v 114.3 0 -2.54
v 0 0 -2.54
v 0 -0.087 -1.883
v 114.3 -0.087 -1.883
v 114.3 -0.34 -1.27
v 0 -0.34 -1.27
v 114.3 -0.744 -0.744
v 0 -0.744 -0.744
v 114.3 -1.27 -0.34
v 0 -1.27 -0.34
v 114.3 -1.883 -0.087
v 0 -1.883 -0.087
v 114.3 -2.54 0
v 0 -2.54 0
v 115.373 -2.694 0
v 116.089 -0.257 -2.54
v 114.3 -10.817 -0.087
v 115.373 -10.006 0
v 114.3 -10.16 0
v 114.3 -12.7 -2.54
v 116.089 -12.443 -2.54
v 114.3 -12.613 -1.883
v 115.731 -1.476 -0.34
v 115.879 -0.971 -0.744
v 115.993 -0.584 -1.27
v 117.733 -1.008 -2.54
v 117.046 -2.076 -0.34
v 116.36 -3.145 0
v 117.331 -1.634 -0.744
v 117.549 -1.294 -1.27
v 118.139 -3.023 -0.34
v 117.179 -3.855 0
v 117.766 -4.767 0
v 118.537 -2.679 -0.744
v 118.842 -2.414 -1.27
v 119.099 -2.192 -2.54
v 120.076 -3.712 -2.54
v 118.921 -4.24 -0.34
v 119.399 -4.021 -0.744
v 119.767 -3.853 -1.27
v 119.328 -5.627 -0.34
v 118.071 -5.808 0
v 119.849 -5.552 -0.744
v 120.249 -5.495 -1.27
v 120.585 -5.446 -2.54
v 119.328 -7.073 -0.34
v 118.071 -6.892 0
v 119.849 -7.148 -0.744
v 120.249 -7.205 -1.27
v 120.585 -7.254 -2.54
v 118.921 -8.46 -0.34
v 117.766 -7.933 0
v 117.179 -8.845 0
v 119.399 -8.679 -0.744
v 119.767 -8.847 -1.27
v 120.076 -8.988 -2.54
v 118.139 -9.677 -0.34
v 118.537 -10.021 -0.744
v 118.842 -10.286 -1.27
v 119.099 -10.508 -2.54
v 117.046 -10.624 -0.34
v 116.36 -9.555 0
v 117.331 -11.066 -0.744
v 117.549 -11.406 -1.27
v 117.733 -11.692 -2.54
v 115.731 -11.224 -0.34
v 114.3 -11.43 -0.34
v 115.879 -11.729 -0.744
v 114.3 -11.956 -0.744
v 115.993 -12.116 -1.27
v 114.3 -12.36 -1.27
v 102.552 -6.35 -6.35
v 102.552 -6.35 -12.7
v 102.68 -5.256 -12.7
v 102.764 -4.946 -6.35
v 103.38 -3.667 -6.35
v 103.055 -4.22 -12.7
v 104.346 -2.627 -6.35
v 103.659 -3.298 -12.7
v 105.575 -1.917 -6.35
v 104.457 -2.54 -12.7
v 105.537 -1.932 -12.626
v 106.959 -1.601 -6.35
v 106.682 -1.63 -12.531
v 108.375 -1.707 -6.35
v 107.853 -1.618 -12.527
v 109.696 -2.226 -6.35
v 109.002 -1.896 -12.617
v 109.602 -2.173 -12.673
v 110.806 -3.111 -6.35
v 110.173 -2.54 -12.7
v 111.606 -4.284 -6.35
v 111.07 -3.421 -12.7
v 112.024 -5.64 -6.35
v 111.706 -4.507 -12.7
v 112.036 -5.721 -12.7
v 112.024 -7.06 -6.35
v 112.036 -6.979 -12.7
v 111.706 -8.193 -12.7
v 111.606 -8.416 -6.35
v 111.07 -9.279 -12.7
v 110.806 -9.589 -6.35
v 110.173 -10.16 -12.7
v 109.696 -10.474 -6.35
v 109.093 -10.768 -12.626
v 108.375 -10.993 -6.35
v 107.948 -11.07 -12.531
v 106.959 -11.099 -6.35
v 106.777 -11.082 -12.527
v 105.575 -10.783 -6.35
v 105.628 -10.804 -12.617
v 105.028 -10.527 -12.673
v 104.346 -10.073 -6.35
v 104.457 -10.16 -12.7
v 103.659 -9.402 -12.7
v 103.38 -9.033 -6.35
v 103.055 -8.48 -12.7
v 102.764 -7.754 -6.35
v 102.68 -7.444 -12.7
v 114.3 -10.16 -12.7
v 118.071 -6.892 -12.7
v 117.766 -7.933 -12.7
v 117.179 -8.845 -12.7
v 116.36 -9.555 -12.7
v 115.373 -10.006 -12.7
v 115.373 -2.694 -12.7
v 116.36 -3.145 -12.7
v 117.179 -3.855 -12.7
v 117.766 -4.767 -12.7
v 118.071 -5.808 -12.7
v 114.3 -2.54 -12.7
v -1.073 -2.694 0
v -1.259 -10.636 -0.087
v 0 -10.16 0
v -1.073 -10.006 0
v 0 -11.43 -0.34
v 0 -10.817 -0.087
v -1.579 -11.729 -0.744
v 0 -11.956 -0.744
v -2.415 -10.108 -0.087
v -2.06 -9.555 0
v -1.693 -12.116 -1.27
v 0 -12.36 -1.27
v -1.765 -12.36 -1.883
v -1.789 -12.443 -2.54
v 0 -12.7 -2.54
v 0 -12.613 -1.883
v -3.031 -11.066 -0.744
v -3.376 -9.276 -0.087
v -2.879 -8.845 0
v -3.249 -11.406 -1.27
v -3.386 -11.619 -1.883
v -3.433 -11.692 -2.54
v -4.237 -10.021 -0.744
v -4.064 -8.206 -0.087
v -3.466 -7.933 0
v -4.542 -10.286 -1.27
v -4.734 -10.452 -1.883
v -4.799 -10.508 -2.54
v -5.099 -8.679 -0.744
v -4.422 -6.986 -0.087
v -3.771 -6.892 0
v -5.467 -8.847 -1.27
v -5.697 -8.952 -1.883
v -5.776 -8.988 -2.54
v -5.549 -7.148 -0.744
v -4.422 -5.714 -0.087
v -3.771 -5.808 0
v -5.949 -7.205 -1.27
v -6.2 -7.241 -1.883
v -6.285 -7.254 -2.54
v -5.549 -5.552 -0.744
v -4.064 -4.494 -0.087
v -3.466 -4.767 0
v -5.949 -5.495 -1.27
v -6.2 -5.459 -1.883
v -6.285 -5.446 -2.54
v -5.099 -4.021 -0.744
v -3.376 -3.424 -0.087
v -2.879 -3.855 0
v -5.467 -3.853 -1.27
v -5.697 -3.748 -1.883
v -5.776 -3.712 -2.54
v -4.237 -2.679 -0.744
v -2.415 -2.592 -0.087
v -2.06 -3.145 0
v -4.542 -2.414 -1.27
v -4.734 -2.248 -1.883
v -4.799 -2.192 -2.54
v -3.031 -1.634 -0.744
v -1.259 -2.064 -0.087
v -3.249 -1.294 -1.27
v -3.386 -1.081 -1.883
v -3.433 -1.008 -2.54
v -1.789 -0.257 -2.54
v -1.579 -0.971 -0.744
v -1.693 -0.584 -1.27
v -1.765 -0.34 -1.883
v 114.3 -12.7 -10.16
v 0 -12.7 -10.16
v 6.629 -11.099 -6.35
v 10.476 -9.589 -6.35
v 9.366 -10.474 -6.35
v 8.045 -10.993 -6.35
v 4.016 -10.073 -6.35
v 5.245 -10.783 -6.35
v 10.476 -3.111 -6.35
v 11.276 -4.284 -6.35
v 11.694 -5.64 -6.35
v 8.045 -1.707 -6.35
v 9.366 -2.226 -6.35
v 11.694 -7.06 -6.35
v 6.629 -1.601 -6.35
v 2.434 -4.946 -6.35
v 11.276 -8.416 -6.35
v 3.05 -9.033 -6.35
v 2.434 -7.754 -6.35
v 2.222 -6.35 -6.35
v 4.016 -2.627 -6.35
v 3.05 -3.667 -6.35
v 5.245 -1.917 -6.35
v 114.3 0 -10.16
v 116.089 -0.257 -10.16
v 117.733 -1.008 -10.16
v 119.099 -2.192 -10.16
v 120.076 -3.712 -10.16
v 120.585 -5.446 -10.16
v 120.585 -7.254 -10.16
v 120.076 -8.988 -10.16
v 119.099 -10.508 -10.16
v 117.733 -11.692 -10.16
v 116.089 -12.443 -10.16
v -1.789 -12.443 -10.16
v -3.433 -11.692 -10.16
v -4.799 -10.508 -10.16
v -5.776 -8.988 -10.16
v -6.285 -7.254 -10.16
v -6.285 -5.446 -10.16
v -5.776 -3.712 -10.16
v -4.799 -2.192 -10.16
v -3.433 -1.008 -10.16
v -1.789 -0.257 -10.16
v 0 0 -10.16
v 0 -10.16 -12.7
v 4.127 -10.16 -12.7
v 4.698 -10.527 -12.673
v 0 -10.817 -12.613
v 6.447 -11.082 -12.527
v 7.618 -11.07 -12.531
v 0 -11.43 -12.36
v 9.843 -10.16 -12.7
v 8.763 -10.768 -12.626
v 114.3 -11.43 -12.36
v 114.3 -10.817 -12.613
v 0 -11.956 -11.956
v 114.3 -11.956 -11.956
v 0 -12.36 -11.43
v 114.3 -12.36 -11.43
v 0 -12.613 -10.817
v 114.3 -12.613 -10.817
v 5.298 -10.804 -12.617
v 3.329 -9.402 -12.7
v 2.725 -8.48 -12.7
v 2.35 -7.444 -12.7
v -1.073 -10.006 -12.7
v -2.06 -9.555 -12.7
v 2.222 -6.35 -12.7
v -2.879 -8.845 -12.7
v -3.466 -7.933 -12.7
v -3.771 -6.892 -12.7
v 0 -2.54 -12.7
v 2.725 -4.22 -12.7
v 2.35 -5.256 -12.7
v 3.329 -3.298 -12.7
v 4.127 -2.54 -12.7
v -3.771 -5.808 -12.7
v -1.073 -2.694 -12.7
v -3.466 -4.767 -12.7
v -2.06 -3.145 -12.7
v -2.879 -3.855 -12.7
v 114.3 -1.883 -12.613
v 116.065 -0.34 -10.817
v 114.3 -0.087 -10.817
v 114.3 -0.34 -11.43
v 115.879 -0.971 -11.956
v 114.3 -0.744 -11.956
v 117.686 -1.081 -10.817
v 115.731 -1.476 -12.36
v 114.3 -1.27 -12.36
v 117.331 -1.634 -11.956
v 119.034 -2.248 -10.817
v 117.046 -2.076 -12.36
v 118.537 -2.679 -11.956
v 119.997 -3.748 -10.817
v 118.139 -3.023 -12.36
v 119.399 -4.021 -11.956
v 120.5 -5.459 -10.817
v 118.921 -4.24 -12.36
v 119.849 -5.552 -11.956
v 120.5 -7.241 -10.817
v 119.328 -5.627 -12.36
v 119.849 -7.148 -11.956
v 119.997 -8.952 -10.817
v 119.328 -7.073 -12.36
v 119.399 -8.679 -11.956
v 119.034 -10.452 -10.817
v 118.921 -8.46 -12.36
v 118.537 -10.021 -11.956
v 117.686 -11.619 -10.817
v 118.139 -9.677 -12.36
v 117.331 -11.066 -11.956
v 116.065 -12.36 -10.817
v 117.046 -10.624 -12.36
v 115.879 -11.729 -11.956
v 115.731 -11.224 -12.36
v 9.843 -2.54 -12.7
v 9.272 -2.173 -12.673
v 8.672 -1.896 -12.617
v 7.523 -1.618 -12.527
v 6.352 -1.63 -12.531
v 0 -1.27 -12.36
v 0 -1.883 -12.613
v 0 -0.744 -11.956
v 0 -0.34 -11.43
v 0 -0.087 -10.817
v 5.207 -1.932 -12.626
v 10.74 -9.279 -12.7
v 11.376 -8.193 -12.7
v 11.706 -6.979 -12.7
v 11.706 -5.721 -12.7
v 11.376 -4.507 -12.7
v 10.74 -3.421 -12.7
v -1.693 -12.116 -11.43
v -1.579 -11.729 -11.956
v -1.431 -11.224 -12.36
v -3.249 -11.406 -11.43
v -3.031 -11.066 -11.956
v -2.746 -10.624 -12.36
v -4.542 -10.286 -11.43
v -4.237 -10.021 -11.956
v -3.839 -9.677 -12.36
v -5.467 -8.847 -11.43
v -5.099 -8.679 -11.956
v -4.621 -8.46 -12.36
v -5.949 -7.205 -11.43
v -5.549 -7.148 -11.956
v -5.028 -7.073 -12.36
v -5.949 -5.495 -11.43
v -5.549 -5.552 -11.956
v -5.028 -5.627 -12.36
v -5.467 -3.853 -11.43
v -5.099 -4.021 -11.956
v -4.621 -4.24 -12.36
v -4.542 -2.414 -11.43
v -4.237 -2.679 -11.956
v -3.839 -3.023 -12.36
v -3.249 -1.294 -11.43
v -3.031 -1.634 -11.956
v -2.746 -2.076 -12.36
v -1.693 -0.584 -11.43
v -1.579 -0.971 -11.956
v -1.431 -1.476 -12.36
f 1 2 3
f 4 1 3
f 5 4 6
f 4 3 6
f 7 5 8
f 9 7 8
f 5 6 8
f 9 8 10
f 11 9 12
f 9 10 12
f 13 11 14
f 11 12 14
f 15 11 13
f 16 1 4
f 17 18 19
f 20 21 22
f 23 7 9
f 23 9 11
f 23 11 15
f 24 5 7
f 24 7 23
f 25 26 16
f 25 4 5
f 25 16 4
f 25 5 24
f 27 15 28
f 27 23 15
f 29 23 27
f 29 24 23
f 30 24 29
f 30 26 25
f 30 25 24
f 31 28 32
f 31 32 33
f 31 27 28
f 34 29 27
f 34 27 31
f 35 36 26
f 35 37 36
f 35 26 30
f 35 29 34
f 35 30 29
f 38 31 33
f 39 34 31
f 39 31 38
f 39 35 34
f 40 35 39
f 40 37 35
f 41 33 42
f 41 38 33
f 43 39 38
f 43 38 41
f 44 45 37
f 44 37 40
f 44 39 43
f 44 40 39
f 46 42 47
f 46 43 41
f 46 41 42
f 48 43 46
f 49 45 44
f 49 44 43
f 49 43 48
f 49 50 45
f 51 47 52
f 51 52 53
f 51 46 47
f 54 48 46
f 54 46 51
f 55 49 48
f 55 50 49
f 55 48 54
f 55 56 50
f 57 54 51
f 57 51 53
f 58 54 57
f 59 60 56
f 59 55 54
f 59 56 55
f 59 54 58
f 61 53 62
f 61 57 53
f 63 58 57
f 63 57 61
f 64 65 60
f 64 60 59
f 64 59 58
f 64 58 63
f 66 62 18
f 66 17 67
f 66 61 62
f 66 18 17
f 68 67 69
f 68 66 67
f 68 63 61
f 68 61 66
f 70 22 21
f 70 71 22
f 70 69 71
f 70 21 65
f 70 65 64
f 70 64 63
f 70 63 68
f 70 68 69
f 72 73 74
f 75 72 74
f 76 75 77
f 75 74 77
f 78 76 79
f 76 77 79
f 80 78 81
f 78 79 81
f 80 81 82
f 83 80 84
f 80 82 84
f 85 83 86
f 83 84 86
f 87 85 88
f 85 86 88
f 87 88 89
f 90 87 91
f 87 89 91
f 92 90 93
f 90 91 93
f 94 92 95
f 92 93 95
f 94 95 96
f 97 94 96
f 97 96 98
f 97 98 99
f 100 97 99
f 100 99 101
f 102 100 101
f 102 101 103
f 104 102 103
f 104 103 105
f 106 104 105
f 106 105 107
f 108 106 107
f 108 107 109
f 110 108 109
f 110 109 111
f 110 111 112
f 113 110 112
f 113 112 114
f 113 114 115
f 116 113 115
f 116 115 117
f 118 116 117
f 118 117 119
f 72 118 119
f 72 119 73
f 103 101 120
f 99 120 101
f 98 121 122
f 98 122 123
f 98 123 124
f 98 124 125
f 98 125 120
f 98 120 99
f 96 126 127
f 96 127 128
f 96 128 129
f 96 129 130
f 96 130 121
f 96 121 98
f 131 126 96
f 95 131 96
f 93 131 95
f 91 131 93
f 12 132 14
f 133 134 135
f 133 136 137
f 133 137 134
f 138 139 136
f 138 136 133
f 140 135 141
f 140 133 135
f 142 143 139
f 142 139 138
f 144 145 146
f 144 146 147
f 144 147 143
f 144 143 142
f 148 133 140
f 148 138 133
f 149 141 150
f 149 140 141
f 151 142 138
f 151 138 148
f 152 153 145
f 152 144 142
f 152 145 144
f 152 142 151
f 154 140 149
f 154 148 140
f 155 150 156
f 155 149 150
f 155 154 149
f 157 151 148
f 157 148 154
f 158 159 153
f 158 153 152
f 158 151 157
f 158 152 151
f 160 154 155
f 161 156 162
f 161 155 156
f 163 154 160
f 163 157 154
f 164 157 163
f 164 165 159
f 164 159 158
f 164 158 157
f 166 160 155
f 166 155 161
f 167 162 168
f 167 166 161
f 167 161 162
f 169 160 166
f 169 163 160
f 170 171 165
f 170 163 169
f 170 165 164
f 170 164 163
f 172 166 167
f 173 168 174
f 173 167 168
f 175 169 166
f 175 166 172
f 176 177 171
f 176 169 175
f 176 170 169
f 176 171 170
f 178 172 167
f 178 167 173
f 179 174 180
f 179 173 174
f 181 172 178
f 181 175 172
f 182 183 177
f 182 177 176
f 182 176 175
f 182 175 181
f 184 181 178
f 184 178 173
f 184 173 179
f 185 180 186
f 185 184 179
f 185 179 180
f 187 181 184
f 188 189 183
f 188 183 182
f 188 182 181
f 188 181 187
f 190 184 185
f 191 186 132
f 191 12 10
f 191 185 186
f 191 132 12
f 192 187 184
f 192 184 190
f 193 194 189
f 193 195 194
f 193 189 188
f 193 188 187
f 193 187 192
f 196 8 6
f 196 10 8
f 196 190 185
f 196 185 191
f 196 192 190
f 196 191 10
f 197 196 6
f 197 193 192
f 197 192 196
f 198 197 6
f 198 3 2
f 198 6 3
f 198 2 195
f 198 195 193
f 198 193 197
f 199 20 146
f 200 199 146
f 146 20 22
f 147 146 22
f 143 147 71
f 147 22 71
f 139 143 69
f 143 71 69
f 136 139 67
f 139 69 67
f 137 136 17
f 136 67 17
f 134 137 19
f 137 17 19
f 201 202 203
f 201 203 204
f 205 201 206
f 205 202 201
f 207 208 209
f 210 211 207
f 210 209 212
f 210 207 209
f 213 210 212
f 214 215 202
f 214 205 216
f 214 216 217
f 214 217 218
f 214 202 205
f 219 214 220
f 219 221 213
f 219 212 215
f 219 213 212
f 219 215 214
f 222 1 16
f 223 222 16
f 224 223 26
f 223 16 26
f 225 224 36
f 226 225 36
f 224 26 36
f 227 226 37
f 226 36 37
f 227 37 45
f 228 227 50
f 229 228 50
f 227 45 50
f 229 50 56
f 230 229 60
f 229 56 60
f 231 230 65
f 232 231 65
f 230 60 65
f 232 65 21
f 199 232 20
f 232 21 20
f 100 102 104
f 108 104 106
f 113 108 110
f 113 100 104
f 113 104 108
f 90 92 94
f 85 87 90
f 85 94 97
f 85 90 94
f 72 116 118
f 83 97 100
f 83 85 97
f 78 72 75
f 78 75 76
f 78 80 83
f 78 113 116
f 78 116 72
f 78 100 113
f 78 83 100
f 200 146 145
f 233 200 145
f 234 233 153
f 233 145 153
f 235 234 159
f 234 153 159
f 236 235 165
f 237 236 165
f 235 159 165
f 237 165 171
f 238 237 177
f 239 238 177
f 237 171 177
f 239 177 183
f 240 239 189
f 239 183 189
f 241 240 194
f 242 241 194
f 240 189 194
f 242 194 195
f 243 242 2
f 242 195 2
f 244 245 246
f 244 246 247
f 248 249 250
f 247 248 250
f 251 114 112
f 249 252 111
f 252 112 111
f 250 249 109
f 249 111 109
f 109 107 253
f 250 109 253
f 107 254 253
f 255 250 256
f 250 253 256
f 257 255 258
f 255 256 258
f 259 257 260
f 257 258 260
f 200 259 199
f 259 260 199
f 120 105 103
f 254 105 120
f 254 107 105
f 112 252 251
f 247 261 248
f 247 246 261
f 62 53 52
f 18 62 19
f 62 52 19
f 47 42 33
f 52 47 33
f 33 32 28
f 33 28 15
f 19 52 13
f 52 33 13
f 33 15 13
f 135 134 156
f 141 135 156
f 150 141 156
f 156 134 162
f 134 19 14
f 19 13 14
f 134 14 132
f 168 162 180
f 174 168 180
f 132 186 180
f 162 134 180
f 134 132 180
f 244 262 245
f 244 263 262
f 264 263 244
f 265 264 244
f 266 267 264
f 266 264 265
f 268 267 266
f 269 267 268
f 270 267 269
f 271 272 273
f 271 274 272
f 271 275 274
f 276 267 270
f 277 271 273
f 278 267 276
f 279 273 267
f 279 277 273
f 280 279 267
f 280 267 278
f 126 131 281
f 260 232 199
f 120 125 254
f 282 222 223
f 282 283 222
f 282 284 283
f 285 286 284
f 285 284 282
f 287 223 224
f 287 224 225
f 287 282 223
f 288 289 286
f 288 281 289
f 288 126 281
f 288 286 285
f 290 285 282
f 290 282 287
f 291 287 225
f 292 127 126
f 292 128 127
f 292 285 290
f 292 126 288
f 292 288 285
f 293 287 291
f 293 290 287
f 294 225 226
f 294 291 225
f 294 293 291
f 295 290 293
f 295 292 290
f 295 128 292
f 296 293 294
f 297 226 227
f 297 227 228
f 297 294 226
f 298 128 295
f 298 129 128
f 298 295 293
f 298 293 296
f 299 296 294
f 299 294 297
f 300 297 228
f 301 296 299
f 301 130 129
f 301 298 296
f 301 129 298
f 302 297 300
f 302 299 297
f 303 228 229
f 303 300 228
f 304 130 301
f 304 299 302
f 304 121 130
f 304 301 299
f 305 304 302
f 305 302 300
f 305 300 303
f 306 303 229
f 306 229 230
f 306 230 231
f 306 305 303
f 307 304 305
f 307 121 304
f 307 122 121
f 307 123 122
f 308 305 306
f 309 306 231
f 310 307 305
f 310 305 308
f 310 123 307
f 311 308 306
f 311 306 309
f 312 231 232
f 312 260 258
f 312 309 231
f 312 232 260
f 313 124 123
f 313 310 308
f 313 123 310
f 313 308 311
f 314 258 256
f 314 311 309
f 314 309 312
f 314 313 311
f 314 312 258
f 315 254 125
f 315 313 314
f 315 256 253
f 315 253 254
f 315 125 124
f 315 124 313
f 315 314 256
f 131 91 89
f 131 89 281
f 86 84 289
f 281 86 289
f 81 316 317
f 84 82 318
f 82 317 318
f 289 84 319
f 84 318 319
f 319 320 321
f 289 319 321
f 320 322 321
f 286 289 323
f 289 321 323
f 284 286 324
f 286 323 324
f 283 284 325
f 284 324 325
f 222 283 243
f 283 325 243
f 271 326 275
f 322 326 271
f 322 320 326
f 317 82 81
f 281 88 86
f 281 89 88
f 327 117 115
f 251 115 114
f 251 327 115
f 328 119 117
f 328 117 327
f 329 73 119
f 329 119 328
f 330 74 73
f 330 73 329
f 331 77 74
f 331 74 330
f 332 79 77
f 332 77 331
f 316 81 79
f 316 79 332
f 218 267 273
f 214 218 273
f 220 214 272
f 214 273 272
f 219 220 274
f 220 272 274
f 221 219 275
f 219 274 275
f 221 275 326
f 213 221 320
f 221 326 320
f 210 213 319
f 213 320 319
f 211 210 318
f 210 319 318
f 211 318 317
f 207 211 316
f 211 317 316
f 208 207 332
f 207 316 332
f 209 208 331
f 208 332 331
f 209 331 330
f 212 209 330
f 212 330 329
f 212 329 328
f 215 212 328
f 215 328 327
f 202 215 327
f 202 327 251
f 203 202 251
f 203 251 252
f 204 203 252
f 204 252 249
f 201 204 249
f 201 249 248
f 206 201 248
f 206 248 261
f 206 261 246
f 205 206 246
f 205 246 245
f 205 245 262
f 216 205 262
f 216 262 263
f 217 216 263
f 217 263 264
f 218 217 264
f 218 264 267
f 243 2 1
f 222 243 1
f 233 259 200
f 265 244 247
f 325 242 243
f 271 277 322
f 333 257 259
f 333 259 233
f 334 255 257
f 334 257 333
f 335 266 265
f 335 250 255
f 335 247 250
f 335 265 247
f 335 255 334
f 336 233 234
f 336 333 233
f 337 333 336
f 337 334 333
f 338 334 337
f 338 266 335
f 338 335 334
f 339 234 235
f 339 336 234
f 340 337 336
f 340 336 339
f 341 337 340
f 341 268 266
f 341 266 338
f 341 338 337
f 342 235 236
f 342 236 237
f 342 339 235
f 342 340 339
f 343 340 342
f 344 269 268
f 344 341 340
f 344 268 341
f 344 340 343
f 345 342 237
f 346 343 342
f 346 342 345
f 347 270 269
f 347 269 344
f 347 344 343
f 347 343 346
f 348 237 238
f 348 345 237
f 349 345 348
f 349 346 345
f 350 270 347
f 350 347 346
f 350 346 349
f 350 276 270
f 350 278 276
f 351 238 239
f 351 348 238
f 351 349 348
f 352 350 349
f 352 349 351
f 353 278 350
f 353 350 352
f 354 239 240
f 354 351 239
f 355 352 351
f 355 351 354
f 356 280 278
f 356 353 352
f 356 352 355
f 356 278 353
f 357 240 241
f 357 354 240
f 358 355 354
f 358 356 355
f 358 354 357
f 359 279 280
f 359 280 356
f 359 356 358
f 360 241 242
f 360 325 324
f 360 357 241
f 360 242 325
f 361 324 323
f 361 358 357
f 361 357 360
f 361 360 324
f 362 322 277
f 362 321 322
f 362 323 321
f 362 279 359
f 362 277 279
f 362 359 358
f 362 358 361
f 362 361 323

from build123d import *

# Parameters (mm, degrees)
BOSS_EXTRUDE1_DEPTH = 12.7
SKETCH2_R           = 4.7625
CUT_EXTRUDE1_DEPTH  = 6.35
FILLET1_R           = 2.54


with BuildPart() as part:
    # Sketch1 → Boss-Extrude1 (new body)
    with BuildSketch(Plane.XY):
        with BuildLine():
            Line((0, 0), (114.3, 0))
            ThreePointArc((114.3, 0), (120.65, -6.35), (114.3, -12.7))
            Line((114.3, -12.7), (0, -12.7))
            ThreePointArc((0, -12.7), (-6.35, -6.35), (0, 0))
        make_face()
    extrude(amount=-BOSS_EXTRUDE1_DEPTH)

    # Sketch2 → Cut-Extrude1 (cut)
    with BuildSketch(Plane(origin=(0, 0, -12.7), x_dir=(-1, 0, 0), z_dir=(0, 0, -1))):
        with Locations((-6.985, -6.35)):
            Circle(SKETCH2_R)
        with Locations((-107.315, -6.35)):
            Circle(SKETCH2_R)
    extrude(amount=-CUT_EXTRUDE1_DEPTH, mode=Mode.SUBTRACT)

    # Fillet1
    # the kernel refuses this fillet: 2.54 mm, written as the material it takes off along each edge
    with BuildSketch(Plane(origin=(114.3, -6.35, -12.7), x_dir=(0, 1, 0), z_dir=(-1, 0, 0))) as fillet1_piece_1:
        with BuildLine():
            CenterArc((6.35 - FILLET1_R, -FILLET1_R), FILLET1_R, 0, 90)
            Line((6.35 - FILLET1_R, 0), (6.35, 0))
            Line((6.35, 0), (6.35, -FILLET1_R))
        make_face()
    revolve(axis=Axis((114.3, -6.35, -12.7), (0, 0, -1)), revolution_arc=180, mode=Mode.SUBTRACT)
    with BuildSketch(Plane(origin=(0, 0, -12.7), x_dir=(0, -1, 0), z_dir=(1, 0, 0)), Plane(origin=(114.3, -12.7, 0), x_dir=(0, 0, -1), z_dir=(-1, 0, 0))) as fillet1_piece_2:
        with BuildLine():
            CenterArc((FILLET1_R, -FILLET1_R), FILLET1_R, 90, 90)
            Line((0, -FILLET1_R), (0, 0))
            Line((0, 0), (FILLET1_R, 0))
        make_face()
    extrude(amount=114.3, mode=Mode.SUBTRACT)
    with BuildSketch(Plane(origin=(0, -6.35, -12.7), x_dir=(0, -1, 0), z_dir=(1, 0, 0))) as fillet1_piece_3:
        with BuildLine():
            CenterArc((6.35 - FILLET1_R, -FILLET1_R), FILLET1_R, 0, 90)
            Line((6.35 - FILLET1_R, 0), (6.35, 0))
            Line((6.35, 0), (6.35, -FILLET1_R))
        make_face()
    revolve(axis=Axis((0, -6.35, -12.7), (0, 0, -1)), revolution_arc=180, mode=Mode.SUBTRACT)
    with BuildSketch(Plane(origin=(0, 0, 0), x_dir=(0, -1, 0), z_dir=(1, 0, 0)), Plane(origin=(114.3, -12.7, -12.7), x_dir=(0, 0, 1), z_dir=(-1, 0, 0))) as fillet1_piece_4:
        with BuildLine():
            CenterArc((FILLET1_R, FILLET1_R), FILLET1_R, 180, 90)
            Line((0, FILLET1_R), (0, 0))
            Line((0, 0), (FILLET1_R, 0))
        make_face()
    extrude(amount=114.3, mode=Mode.SUBTRACT)
    with BuildSketch(Plane(origin=(114.3, -6.35, 0), x_dir=(0, 1, 0), z_dir=(-1, 0, 0))) as fillet1_piece_5:
        with BuildLine():
            CenterArc((6.35 - FILLET1_R, FILLET1_R), FILLET1_R, 270, 90)
            Line((6.35 - FILLET1_R, 0), (6.35, 0))
            Line((6.35, 0), (6.35, FILLET1_R))
        make_face()
    revolve(axis=Axis((114.3, -6.35, 0), (0, 0, -1)), revolution_arc=180, mode=Mode.SUBTRACT)
    with BuildSketch(Plane(origin=(0, -6.35, 0), x_dir=(0, -1, 0), z_dir=(1, 0, 0))) as fillet1_piece_6:
        with BuildLine():
            CenterArc((6.35 - FILLET1_R, FILLET1_R), FILLET1_R, 270, 90)
            Line((6.35 - FILLET1_R, 0), (6.35, 0))
            Line((6.35, 0), (6.35, FILLET1_R))
        make_face()
    revolve(axis=Axis((0, -6.35, 0), (0, 0, -1)), revolution_arc=180, mode=Mode.SUBTRACT)


solid = part.part
